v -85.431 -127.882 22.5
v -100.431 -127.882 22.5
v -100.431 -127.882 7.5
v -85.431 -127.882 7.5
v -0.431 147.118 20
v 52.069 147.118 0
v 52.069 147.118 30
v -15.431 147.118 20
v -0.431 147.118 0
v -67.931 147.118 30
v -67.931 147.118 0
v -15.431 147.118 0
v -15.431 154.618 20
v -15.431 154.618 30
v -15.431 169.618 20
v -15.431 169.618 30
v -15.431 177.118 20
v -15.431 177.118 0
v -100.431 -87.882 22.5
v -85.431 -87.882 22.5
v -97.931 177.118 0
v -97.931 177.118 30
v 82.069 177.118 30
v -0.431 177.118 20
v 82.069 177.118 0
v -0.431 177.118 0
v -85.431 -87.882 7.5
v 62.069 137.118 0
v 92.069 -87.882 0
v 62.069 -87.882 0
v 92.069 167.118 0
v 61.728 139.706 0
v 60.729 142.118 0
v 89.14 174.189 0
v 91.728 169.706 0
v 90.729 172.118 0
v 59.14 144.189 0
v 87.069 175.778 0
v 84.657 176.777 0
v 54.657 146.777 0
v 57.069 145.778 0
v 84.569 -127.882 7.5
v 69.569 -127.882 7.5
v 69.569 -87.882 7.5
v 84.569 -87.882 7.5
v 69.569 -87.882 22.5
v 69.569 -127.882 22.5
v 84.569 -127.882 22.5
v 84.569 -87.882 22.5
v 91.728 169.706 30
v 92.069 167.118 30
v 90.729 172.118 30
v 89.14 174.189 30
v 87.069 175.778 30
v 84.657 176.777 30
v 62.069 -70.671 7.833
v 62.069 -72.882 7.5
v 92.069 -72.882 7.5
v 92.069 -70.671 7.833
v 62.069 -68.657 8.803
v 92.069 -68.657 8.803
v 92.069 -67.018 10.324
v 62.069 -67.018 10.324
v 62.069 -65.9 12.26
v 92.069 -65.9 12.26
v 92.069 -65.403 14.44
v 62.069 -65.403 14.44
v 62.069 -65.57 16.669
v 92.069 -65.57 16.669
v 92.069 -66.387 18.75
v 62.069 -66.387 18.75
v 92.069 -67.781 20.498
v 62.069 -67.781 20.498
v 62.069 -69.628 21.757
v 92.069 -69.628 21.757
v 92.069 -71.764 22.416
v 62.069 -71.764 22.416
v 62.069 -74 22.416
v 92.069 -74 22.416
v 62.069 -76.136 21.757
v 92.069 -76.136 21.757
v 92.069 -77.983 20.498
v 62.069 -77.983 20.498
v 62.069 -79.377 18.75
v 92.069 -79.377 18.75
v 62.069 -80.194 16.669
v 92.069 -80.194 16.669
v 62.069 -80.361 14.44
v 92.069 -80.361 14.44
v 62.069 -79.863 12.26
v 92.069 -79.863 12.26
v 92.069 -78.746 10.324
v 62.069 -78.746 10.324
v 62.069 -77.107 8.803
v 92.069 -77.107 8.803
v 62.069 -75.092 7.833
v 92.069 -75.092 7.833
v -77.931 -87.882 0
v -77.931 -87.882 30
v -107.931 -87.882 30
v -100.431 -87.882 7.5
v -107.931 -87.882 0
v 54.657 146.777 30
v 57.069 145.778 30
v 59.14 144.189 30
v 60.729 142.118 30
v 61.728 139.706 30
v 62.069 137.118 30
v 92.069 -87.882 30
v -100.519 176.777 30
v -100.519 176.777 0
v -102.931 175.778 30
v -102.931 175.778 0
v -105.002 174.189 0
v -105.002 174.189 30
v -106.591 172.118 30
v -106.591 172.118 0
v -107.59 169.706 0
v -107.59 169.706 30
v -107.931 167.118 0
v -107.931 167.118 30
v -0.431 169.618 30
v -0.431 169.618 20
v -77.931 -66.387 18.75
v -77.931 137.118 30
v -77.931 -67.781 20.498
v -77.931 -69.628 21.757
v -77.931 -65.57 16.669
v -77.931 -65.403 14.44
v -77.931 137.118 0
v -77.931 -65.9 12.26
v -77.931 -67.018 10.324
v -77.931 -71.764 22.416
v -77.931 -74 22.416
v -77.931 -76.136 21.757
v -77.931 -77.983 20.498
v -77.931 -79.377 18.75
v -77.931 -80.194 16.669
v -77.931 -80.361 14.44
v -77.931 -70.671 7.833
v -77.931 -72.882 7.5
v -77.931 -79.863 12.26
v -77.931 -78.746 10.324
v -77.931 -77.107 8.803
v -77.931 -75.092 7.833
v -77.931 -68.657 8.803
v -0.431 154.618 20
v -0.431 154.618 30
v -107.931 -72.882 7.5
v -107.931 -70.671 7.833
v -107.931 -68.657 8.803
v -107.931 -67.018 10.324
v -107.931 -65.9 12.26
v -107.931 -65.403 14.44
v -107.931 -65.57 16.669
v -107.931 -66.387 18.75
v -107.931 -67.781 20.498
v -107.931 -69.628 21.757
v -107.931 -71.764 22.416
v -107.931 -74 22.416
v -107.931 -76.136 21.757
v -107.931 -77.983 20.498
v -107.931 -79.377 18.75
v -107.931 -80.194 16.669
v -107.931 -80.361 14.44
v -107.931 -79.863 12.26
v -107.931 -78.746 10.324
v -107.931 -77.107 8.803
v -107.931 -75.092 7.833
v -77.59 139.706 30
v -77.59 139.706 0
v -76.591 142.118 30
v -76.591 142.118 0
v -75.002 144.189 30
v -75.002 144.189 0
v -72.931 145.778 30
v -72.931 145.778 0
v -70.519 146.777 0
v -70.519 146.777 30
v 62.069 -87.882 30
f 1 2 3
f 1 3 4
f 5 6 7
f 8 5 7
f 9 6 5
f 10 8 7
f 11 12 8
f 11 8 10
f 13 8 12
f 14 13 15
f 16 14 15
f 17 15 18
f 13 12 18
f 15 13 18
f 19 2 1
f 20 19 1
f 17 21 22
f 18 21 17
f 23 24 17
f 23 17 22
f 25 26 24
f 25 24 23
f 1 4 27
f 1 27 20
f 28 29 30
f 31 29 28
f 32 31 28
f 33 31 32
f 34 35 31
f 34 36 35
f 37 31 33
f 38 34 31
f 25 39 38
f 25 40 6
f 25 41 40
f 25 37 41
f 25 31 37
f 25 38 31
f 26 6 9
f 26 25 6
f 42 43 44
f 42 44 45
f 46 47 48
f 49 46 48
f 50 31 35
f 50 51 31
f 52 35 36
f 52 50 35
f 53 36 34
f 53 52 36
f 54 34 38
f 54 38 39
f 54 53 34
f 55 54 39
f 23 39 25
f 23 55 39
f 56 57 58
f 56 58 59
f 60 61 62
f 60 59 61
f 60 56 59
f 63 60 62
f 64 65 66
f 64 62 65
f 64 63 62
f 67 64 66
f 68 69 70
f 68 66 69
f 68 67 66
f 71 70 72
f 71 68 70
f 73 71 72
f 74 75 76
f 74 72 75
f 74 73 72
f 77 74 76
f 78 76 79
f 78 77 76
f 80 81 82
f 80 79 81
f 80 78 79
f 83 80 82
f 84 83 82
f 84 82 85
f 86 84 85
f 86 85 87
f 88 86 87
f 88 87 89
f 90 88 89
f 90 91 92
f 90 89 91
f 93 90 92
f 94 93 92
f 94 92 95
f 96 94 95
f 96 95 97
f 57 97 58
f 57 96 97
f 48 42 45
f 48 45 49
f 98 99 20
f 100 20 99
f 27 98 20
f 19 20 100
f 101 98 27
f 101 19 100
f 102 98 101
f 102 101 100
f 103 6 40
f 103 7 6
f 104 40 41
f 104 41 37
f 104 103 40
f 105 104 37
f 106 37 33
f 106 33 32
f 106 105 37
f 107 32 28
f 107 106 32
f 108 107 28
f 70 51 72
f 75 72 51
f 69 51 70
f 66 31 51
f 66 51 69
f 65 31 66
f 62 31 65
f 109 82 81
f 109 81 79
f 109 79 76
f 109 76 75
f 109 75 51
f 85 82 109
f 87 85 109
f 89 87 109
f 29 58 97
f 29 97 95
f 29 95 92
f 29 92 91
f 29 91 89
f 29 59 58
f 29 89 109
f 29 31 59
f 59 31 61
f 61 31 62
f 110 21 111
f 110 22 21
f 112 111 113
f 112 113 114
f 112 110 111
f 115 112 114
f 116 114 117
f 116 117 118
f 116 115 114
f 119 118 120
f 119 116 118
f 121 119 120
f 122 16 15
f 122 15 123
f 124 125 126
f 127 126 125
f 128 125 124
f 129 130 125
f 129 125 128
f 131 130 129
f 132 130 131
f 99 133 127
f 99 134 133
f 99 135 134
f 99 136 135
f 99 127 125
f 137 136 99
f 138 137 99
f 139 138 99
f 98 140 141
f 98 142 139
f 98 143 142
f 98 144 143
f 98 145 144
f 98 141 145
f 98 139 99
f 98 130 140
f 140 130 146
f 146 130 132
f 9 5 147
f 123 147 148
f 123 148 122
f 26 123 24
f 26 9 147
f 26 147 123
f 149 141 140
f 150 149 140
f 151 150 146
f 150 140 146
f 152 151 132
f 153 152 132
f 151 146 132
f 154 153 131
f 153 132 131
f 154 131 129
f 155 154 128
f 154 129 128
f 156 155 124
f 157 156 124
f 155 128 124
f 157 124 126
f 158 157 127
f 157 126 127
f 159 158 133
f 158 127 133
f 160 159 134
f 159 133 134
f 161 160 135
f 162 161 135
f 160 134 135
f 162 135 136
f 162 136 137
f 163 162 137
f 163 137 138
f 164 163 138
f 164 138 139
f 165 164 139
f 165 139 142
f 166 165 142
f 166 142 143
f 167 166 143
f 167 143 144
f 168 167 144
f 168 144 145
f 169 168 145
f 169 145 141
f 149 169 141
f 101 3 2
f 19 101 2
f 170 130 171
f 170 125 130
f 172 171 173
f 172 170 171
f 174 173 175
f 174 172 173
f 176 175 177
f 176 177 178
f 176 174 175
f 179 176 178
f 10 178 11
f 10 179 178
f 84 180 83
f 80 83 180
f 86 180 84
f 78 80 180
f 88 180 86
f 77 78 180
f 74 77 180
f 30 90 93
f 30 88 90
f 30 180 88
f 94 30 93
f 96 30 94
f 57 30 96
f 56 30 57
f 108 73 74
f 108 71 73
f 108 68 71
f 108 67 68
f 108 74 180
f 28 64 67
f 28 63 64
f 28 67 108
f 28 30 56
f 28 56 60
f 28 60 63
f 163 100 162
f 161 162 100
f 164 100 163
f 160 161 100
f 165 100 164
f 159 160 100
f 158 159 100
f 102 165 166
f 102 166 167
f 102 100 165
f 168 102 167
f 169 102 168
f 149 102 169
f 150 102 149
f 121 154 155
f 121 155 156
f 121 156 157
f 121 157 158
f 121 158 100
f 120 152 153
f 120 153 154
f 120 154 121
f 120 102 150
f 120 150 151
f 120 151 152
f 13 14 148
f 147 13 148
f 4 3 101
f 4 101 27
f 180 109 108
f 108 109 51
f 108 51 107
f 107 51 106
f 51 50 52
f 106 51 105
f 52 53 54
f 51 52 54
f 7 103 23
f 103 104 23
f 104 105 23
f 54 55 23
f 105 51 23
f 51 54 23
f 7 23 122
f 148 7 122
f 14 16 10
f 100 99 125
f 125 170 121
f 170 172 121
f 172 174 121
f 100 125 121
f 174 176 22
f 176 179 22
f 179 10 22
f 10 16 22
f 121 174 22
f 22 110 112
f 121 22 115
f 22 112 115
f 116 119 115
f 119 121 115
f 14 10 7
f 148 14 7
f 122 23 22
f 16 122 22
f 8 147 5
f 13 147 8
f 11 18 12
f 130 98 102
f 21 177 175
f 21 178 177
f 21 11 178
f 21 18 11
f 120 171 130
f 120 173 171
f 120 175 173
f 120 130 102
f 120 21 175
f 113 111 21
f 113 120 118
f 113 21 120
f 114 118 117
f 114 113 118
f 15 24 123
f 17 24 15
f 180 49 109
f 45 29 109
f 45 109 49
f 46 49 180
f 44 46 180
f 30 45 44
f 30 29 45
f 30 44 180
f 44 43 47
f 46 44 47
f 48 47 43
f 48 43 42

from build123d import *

# Parameters (mm, degrees)
BOSS_EXTRUDE1_DEPTH     = 30
SKETCH2_W               = 15
SKETCH2_H               = 15
BOSS_EXTRUDE2_DEPTH     = 40
FILLET1_R               = 10
FILLET2_R               = 10
SKETCH3_R               = 7.5
CUT_EXTRUDE1_DEPTH      = 171
CUT_EXTRUDE1_DEPTH_BACK = 31
SKETCH4_W               = 15
SKETCH4_H               = 30
CUT_EXTRUDE2_DEPTH      = 20
SKETCH5_W               = 15
SKETCH5_H               = 15
CUT_EXTRUDE3_DEPTH      = 10


with BuildPart() as part:
    # Sketch1 → Boss-Extrude1 (new body)
    with BuildSketch(Plane.XY):
        Polygon((-77.931034483, -87.881800857), (-107.931034483, -87.881800857), (-107.931034483, 177.118199143), (92.068965517, 177.118199143), (92.068965517, -87.881800857), (62.068965517, -87.881800857), (62.068965517, 147.118199143), (-77.931034483, 147.118199143), align=None)
    extrude(amount=BOSS_EXTRUDE1_DEPTH)

    # Sketch2 → Boss-Extrude2 (add)
    with BuildSketch(Plane.XZ.offset(87.881800857)):
        with Locations((77.068965517, 15)):
            Rectangle(SKETCH2_W, SKETCH2_H)
        with Locations((-92.931034483, 15)):
            Rectangle(SKETCH2_W, SKETCH2_H)
    extrude(amount=BOSS_EXTRUDE2_DEPTH)

    # Fillet1
    fillet1_edges = [part.edges().sort_by_distance(p)[0] for p in [
        (62.068965517, 147.118199143, 15),
        (-77.931034483, 147.118199143, 15),
    ]]
    fillet(fillet1_edges, radius=FILLET1_R)

    # Fillet2
    fillet2_edges = [part.edges().sort_by_distance(p)[0] for p in [
        (-107.931034483, 177.118199143, 15),
        (92.068965517, 177.118199143, 15),
    ]]
    fillet(fillet2_edges, radius=FILLET2_R)

    # Sketch3 → Cut-Extrude1 (cut, two sides)
    with BuildSketch(Plane(origin=(-77.931034483, 0, 0), x_dir=(0, 0, -1), z_dir=(1, 0, 0))) as cut_extrude1_sk:
        with Locations((-15, -72.881800857)):
            Circle(SKETCH3_R)
    extrude(amount=CUT_EXTRUDE1_DEPTH, mode=Mode.SUBTRACT)
    extrude(cut_extrude1_sk.sketch, amount=-CUT_EXTRUDE1_DEPTH_BACK, mode=Mode.SUBTRACT)

    # Sketch4 → Cut-Extrude2 (cut)
    with BuildSketch(Plane(origin=(0, 0, 0), x_dir=(-1, 0, 0), z_dir=(0, 0, -1))):
        with Locations((7.930867489, 162.118199143)):
            Rectangle(SKETCH4_W, SKETCH4_H)
    extrude(amount=-CUT_EXTRUDE2_DEPTH, mode=Mode.SUBTRACT)

    # Sketch5 → Cut-Extrude3 (cut)
    with BuildSketch(Plane.XY.offset(30)):
        with Locations((-7.930867489, 162.118199143)):
            Rectangle(SKETCH5_W, SKETCH5_H)
    extrude(amount=-CUT_EXTRUDE3_DEPTH, mode=Mode.SUBTRACT)


solid = part.part
